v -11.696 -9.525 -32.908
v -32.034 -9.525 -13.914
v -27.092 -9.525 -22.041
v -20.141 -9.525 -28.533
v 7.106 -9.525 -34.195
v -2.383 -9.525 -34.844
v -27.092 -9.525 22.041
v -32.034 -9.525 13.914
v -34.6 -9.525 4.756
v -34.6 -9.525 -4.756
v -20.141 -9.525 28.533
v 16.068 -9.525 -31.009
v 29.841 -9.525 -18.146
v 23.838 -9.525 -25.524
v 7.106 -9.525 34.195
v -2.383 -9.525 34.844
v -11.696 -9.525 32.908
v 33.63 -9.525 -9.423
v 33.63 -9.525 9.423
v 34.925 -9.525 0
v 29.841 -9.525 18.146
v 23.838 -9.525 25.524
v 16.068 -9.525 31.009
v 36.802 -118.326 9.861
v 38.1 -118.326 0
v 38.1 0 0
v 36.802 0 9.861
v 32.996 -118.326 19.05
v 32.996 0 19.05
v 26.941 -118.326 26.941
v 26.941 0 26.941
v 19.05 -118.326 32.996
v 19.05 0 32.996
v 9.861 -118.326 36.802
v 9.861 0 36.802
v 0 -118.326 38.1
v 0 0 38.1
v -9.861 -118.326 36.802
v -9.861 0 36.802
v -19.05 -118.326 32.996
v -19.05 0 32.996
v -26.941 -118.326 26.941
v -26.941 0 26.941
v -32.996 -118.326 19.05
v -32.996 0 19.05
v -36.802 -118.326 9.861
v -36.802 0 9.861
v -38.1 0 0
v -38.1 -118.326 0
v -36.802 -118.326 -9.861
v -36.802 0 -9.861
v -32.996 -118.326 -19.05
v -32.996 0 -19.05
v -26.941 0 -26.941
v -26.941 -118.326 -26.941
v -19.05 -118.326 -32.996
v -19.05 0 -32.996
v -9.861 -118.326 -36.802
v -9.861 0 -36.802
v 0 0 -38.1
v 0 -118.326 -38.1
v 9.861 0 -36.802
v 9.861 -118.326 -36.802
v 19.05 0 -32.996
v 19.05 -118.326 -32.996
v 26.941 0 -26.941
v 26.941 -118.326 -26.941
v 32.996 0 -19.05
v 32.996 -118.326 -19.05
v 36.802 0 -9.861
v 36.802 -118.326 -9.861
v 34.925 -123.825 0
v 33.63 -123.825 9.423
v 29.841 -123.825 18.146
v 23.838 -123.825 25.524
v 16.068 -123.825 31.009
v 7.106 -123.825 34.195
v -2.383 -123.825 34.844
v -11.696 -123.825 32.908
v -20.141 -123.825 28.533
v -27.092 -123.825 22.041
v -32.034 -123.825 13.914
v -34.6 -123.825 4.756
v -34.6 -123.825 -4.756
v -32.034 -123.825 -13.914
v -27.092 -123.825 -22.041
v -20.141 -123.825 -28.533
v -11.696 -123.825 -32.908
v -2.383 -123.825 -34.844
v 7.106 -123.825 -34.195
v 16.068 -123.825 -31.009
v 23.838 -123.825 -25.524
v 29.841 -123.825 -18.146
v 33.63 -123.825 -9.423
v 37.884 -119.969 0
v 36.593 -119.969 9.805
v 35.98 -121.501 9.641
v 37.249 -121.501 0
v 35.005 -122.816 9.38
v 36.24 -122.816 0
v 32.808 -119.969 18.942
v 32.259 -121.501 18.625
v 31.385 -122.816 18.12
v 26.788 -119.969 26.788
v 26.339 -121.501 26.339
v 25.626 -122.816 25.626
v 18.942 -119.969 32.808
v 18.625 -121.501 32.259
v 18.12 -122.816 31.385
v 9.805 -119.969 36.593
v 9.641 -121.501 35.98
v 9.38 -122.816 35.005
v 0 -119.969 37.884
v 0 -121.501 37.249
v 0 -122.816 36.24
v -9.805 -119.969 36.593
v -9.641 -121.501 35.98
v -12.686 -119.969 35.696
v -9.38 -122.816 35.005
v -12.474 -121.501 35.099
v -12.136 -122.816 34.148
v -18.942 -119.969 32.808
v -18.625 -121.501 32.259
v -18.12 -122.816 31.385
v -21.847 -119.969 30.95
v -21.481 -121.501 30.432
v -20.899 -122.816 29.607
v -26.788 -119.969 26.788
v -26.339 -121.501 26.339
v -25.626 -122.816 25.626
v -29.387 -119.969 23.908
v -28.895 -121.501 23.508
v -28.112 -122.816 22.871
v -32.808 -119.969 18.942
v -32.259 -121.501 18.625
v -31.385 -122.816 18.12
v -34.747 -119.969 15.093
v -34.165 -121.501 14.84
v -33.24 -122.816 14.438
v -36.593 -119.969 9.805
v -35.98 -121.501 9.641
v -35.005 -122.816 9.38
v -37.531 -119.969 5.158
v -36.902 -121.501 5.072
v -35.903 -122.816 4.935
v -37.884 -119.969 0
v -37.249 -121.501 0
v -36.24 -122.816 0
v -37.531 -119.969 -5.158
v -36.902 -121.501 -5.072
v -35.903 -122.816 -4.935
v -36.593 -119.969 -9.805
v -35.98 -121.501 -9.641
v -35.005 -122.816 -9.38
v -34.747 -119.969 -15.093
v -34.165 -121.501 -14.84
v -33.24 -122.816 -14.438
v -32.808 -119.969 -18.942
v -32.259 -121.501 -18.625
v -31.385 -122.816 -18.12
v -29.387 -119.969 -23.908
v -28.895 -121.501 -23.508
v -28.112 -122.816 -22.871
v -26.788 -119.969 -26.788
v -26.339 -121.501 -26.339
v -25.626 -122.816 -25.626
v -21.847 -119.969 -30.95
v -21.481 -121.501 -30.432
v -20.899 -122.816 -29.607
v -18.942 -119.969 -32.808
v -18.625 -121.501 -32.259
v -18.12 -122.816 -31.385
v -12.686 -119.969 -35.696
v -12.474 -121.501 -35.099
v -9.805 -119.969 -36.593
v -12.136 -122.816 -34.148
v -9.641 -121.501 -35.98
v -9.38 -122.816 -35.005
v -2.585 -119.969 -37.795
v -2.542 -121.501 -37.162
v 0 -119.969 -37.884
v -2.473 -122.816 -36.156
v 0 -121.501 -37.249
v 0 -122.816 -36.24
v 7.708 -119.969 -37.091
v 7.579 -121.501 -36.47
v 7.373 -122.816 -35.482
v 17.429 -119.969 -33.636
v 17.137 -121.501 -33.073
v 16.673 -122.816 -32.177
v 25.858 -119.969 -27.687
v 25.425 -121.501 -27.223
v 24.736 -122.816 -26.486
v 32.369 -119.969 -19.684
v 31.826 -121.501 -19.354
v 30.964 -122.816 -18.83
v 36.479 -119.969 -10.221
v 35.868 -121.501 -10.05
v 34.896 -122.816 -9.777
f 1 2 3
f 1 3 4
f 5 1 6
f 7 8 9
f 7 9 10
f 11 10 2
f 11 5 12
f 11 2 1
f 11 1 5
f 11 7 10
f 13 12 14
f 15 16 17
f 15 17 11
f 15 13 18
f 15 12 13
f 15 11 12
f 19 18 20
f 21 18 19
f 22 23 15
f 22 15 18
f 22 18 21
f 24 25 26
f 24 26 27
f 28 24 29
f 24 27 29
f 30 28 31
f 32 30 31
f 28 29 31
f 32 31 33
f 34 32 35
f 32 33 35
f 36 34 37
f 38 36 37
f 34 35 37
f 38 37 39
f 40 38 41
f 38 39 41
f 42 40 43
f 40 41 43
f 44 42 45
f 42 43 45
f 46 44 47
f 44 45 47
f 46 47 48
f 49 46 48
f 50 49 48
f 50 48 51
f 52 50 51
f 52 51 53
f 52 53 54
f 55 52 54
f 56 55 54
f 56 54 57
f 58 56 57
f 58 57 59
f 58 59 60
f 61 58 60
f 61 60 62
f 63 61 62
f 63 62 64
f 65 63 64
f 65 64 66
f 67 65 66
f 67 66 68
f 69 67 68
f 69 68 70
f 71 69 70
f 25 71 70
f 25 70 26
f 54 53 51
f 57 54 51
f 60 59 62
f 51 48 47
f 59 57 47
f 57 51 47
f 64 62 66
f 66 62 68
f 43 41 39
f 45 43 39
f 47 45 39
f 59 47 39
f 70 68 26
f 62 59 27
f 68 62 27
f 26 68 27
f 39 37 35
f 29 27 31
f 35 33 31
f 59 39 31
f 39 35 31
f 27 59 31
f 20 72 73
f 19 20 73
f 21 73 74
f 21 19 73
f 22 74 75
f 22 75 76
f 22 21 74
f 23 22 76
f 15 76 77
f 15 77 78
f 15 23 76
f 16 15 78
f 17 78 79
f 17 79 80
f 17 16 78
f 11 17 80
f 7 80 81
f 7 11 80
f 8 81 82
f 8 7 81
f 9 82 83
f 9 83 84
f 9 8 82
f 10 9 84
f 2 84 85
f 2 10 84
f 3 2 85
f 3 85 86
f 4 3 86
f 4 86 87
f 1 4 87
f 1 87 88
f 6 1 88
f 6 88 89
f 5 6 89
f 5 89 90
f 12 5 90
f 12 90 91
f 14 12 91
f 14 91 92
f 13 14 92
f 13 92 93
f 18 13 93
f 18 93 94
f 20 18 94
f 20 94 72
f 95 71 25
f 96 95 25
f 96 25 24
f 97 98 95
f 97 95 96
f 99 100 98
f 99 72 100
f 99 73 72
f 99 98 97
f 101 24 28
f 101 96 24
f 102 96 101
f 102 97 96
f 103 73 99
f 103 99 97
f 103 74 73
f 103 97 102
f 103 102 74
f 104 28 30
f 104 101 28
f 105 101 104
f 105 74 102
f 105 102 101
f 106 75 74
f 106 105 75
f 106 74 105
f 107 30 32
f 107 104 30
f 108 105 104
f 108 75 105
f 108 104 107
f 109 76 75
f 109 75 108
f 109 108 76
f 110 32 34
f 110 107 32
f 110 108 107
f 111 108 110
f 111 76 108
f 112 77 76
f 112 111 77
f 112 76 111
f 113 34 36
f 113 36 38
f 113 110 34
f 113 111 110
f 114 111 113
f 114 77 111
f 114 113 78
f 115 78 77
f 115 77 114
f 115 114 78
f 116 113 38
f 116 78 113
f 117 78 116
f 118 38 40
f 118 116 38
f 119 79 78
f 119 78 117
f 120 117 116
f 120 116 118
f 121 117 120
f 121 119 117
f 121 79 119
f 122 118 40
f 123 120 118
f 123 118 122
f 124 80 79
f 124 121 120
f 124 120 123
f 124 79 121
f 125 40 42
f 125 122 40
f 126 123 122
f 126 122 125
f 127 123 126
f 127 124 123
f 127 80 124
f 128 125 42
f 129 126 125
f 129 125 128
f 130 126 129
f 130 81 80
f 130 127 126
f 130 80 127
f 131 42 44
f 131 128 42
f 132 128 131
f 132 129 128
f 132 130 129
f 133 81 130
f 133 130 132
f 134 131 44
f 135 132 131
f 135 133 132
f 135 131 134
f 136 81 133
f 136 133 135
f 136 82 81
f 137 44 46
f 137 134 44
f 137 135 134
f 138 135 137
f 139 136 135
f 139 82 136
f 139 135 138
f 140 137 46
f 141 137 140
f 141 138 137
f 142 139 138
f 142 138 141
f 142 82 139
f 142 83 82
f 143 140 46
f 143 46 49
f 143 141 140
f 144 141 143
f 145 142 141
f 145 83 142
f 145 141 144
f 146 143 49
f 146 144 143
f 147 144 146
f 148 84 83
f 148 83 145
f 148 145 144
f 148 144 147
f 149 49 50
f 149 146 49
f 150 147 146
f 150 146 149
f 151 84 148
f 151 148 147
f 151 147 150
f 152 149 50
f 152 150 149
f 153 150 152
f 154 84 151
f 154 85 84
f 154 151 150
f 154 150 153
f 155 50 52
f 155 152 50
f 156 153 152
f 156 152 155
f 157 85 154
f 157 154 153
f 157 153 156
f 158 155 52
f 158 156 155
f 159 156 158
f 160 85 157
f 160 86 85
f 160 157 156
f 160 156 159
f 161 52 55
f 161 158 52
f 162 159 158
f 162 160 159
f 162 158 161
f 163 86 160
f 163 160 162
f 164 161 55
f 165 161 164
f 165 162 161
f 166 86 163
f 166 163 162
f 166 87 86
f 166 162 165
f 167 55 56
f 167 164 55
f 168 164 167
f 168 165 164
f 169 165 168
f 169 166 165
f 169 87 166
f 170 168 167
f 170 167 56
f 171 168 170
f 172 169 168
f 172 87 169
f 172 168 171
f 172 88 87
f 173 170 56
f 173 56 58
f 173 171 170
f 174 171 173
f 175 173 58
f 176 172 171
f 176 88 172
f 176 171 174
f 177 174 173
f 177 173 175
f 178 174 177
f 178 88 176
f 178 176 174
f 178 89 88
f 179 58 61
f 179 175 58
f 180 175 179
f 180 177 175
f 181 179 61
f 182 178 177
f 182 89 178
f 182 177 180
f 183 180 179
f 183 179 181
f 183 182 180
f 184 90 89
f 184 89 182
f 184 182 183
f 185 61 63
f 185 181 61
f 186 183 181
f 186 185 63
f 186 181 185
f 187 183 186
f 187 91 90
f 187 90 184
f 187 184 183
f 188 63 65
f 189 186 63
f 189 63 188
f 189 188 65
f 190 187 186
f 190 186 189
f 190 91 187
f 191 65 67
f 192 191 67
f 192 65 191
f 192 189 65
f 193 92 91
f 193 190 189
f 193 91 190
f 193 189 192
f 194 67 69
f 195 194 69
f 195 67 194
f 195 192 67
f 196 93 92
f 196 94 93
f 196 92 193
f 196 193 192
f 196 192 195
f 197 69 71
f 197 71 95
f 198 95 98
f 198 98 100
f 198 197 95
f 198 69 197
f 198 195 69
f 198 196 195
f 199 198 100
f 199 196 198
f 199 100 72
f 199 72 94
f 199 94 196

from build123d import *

# Parameters (mm, degrees)
F0_R     = 34.925
F1_DEPTH = 9.525
F0_R_2   = 38.1
F2_DEPTH = 123.825


# Not quite as in the source:
# - a fillet or chamfer that OpenCascade refuses, or shapes differently, is made with other operations: its cross-section is extruded or revolved along the edge and cut away or added


with BuildPart() as f1:
    # F0 (on Front) → F1 (new body)
    with BuildSketch(Plane.XZ):
        Circle(F0_R)
    extrude(amount=F1_DEPTH)

    # F0 (on Front) → F2 (join)
    with BuildSketch(Plane.XZ):
        Circle(F0_R_2)
        Circle(F0_R, mode=Mode.SUBTRACT)
    extrude(amount=F2_DEPTH)

    # F3: fillet of radius 6.35 on 1 edges, made by hand

    # F3_s1 → F3_t2 (revolve, cut)
    with BuildSketch(Plane.XY):
        with BuildLine():
            ThreePointArc((38.1, -118.325738686), (37.249261314, -121.500738686), (34.925, -123.825))
            Line((34.925, -123.825), (38.1, -123.825))
            Line((38.1, -123.825), (38.1, -118.325738686))
        make_face()
    revolve(axis=Axis((0, -123.825, 0), (0, -1, 0)), mode=Mode.SUBTRACT)


solid = f1.part
